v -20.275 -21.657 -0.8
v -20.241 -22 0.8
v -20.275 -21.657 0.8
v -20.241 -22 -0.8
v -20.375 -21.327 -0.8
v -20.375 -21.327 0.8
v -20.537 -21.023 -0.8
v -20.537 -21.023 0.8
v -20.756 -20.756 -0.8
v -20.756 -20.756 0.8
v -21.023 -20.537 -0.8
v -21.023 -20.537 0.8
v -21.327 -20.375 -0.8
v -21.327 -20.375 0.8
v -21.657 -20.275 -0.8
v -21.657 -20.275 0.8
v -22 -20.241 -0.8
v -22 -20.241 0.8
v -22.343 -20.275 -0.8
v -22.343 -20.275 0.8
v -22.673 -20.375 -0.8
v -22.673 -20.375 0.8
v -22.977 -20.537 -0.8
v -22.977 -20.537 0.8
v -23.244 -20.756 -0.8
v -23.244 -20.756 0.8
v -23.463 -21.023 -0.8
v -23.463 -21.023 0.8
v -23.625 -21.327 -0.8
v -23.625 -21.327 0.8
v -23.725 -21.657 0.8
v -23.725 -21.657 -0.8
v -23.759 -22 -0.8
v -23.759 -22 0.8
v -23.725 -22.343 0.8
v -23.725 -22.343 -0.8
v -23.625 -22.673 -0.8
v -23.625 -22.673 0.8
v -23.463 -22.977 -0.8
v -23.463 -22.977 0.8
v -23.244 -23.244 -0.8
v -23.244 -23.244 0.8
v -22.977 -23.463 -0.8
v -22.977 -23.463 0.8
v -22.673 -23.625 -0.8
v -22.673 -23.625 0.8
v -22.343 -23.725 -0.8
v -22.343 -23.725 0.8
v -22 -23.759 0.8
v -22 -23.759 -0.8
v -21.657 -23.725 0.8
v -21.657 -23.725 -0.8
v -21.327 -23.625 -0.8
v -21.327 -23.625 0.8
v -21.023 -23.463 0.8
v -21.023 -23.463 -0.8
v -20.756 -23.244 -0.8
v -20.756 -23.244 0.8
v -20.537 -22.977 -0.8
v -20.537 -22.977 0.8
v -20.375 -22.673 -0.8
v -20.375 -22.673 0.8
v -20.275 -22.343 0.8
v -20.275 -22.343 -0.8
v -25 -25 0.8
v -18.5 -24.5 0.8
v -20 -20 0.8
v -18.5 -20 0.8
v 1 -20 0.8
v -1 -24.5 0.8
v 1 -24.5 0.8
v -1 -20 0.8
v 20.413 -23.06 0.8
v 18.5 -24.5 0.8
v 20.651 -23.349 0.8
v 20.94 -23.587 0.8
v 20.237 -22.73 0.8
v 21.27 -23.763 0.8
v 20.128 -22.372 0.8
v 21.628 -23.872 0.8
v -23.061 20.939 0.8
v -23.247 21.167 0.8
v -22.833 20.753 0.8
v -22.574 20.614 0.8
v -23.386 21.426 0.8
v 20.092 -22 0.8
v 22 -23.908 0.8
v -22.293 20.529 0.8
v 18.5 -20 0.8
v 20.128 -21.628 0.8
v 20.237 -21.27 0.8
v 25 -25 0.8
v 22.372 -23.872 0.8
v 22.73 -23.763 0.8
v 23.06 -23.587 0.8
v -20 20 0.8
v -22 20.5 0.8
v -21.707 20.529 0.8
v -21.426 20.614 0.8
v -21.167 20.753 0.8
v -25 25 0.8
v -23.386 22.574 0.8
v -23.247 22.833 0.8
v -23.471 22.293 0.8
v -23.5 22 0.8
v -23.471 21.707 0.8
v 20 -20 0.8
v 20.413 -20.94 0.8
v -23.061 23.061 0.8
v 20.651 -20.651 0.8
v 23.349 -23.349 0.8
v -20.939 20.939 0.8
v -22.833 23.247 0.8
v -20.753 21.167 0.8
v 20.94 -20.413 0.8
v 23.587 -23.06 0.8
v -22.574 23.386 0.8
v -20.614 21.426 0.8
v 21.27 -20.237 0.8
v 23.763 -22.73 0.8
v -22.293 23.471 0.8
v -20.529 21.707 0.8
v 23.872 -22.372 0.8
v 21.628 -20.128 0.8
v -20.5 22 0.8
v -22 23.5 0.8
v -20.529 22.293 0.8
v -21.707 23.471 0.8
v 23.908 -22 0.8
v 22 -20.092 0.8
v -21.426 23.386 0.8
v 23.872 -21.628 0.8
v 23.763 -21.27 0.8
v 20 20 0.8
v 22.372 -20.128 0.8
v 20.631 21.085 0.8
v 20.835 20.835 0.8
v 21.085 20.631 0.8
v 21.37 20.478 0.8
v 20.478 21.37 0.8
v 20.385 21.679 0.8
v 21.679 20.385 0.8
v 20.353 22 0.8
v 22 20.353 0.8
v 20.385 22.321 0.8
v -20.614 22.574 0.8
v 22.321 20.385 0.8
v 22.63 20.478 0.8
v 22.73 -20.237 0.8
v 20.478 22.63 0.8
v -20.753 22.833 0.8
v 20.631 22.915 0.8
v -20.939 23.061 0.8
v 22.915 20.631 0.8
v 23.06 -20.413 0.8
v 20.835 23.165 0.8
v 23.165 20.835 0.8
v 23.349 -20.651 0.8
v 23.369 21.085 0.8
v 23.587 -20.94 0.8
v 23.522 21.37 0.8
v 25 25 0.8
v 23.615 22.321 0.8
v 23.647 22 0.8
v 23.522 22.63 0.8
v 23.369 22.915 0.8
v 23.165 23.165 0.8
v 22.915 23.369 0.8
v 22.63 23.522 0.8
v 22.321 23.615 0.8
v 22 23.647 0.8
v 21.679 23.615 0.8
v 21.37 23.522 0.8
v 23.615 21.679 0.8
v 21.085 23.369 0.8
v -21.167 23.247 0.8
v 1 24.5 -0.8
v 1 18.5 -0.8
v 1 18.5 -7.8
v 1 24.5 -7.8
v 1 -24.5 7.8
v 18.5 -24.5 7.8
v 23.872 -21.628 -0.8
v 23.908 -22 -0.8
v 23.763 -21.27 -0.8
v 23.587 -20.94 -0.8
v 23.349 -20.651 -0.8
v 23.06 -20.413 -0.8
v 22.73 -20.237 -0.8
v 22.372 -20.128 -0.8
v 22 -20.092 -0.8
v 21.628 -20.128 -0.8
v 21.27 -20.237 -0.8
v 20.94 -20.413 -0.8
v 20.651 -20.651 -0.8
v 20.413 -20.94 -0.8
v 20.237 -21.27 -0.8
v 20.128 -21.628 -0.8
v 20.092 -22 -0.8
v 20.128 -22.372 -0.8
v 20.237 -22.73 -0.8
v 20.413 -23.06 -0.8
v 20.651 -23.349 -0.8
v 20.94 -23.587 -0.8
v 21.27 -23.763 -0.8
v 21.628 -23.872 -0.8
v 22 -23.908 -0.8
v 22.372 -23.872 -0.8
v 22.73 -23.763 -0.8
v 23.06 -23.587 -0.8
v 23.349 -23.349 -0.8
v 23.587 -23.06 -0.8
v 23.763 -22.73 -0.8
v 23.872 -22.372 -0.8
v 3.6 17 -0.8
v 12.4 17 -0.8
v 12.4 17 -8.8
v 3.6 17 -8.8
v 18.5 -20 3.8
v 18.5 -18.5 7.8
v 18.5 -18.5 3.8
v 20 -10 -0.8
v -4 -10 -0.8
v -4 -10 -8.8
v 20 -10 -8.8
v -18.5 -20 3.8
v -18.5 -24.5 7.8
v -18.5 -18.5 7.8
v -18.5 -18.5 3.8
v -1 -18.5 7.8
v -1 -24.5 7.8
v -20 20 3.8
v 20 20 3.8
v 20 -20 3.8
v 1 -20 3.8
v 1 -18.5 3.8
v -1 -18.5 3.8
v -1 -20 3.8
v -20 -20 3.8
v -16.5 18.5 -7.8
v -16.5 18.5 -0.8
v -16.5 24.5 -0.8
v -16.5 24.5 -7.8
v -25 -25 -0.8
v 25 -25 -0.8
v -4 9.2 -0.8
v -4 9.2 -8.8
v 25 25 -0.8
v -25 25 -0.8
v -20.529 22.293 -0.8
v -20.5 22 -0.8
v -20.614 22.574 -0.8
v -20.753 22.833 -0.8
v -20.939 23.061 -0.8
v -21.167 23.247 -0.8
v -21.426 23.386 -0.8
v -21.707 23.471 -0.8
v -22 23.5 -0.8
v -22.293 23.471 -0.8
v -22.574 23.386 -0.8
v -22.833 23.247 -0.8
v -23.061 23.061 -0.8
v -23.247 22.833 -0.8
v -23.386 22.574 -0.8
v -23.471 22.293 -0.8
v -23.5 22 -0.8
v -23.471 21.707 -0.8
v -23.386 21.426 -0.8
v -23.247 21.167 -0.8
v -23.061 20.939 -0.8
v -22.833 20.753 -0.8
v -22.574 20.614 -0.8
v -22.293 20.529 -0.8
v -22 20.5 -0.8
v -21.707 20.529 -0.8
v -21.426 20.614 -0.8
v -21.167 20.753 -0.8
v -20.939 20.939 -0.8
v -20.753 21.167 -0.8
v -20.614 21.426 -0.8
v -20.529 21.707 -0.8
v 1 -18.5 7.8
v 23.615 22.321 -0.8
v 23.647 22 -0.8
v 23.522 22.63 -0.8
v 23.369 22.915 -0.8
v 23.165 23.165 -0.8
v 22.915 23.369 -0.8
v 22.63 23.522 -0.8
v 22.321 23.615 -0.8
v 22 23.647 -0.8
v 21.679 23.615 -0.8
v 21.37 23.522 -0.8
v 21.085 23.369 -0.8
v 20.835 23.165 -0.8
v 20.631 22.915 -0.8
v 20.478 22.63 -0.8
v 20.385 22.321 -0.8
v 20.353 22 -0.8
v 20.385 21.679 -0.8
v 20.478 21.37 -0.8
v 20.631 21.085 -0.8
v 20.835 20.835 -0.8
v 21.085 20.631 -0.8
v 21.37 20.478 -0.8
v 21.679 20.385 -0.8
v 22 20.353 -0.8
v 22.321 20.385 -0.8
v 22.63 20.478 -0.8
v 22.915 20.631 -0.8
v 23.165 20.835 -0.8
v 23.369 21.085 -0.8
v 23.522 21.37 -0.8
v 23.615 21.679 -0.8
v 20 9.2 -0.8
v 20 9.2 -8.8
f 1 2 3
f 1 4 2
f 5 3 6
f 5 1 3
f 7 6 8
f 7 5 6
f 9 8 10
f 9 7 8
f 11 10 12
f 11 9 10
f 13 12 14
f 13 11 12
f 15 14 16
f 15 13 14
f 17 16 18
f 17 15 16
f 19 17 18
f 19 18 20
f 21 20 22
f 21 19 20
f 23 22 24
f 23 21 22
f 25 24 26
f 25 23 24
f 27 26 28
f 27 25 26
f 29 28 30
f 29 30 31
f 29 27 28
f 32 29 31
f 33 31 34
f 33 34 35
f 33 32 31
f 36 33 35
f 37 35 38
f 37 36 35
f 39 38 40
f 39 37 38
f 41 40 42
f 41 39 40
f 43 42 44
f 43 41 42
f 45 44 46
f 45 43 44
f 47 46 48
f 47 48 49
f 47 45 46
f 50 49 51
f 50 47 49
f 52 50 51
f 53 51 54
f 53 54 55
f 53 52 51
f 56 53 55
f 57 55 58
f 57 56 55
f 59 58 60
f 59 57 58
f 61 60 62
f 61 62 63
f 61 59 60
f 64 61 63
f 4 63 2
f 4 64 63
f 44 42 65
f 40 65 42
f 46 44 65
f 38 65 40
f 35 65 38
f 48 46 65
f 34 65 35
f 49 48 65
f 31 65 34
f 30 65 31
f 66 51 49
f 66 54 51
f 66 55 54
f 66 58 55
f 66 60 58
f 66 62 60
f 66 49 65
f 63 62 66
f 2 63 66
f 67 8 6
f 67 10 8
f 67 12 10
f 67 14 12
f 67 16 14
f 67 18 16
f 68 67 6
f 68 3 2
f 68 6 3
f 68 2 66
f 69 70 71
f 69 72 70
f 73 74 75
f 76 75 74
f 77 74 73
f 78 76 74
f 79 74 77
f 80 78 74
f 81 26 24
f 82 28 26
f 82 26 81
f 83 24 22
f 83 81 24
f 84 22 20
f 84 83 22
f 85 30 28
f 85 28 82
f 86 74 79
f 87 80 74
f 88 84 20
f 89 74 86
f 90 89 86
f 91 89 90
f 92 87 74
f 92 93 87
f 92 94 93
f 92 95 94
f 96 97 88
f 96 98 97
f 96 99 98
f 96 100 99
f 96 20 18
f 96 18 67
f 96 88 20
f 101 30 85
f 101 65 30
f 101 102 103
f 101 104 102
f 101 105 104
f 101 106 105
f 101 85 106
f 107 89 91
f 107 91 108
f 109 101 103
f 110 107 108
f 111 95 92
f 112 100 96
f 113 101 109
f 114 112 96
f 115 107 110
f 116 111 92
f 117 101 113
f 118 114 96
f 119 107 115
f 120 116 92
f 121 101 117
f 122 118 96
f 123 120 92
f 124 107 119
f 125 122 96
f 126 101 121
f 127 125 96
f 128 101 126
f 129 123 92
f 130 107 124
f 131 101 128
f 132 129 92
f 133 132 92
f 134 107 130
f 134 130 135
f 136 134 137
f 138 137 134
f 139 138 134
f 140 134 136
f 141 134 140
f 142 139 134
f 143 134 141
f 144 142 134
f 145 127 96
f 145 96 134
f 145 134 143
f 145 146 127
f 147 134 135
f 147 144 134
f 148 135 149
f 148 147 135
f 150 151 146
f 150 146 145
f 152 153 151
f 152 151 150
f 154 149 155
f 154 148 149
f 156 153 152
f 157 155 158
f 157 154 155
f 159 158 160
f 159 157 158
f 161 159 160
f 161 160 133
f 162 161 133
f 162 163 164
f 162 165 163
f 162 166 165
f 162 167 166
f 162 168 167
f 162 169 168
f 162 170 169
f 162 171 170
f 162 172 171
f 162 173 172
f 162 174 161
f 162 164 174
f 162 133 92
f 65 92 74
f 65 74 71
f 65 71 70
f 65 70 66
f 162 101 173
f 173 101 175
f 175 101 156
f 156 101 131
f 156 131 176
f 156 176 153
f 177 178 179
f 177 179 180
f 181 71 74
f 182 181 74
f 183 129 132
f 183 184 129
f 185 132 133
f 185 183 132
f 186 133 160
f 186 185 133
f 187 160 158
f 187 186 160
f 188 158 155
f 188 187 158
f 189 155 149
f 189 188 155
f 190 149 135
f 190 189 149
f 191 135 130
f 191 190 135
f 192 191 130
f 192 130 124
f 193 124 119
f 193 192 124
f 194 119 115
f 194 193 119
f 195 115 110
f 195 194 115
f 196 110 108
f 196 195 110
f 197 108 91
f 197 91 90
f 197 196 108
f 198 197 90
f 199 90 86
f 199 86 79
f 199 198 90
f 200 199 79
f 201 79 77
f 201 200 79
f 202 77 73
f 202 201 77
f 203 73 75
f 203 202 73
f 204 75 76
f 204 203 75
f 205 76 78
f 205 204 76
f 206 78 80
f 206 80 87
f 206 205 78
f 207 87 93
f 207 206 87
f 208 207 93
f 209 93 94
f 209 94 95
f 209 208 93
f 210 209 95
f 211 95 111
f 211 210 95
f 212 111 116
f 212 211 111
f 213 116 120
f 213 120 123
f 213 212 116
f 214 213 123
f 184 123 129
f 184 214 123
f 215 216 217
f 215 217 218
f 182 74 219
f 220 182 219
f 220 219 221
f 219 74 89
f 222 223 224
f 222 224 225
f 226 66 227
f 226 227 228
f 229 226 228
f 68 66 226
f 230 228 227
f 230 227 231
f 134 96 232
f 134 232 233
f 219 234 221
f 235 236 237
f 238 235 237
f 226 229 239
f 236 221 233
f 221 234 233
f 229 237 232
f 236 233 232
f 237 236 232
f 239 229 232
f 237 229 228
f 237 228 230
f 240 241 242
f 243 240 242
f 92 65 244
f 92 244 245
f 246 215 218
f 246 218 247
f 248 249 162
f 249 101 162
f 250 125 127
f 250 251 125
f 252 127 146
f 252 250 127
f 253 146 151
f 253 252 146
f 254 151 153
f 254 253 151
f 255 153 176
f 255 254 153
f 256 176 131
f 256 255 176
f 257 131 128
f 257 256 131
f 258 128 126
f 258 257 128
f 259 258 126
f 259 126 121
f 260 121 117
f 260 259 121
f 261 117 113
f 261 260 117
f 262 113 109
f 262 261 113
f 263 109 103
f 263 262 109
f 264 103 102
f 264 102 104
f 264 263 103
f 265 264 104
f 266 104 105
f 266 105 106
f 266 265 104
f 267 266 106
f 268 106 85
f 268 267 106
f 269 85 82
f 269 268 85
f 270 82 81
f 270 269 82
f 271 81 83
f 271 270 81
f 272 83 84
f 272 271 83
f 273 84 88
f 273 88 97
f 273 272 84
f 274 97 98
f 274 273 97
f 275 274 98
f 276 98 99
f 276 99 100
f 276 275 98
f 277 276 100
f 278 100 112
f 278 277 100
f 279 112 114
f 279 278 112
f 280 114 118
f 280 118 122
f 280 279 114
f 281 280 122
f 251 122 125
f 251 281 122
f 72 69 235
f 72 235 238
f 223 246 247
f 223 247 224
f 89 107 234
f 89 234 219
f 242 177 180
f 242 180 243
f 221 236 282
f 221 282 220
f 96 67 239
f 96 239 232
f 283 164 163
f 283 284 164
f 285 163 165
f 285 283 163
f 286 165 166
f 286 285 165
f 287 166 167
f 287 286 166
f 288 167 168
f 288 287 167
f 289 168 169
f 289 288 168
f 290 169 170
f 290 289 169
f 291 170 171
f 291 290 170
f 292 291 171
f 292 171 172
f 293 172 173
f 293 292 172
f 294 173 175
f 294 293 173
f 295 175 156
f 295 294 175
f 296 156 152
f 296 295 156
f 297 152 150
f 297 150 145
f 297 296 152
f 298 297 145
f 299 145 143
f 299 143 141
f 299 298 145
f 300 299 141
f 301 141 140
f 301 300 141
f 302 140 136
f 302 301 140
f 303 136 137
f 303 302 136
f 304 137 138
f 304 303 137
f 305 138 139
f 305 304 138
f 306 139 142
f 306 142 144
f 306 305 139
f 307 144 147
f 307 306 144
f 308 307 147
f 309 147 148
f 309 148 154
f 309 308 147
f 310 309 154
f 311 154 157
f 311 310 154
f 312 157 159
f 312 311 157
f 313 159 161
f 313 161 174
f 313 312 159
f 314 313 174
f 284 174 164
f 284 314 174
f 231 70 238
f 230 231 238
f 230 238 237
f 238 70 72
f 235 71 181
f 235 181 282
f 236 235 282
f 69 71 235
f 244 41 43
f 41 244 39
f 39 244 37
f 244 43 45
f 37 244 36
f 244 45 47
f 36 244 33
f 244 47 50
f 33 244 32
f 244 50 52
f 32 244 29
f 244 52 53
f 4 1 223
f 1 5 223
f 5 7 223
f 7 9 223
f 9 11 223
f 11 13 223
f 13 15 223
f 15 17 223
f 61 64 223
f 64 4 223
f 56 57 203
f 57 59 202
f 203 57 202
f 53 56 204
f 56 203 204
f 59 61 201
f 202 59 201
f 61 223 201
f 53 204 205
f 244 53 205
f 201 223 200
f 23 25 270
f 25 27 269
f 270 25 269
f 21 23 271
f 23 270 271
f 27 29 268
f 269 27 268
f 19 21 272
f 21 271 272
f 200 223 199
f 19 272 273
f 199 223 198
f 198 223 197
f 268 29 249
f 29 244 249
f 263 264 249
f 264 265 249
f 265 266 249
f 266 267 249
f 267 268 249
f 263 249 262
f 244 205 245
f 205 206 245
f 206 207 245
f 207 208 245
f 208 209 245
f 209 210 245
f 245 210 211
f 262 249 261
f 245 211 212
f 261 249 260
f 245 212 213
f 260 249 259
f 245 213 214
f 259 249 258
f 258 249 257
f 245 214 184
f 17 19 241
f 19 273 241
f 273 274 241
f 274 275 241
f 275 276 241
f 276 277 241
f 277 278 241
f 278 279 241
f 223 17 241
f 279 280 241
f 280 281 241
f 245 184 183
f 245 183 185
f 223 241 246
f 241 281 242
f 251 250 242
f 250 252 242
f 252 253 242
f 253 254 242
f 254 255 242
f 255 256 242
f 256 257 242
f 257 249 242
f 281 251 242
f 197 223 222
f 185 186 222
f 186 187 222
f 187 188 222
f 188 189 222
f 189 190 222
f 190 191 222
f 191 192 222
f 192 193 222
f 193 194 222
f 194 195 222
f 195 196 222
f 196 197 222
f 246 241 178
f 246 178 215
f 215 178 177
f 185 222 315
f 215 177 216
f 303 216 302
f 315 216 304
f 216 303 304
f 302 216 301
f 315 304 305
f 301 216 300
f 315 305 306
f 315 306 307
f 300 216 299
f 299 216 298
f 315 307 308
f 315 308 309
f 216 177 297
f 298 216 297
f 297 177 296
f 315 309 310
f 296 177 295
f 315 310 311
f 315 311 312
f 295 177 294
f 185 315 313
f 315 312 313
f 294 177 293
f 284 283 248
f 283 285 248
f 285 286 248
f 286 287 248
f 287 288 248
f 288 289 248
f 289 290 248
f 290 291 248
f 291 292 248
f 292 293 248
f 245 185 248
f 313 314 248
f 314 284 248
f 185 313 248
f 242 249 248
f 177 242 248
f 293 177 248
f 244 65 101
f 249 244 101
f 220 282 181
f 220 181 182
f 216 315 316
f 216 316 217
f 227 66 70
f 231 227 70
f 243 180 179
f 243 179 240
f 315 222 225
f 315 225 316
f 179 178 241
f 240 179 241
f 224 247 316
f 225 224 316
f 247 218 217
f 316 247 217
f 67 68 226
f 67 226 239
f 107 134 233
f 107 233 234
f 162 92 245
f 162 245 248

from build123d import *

# Parameters (mm, degrees)
SKETCH1_W      = 50
SKETCH1_H      = 50
SKETCH1_R      = 1.5
SKETCH1_R_2    = 1.646935024
SKETCH1_R_3    = 1.908192471
SKETCH1_R_4    = 1.759080553
EXTRUDE2_DEPTH = 0.8
EXTRUDE3_DEPTH = 3
EXTRUDE4_DEPTH = 8
SKETCH4_W      = 17.5
SKETCH4_H      = 6
EXTRUDE6_DEPTH = 7
SKETCH5_W      = 17.5
SKETCH5_H      = 6
EXTRUDE7_DEPTH = 7


with BuildPart() as part:
    # Sketch1 → Extrude2 (new, symmetric)
    with BuildSketch(Plane.XY):
        Rectangle(SKETCH1_W, SKETCH1_H)
        with Locations((-22, 22)):
            Circle(SKETCH1_R, mode=Mode.SUBTRACT)
        with Locations((22, 22)):
            Circle(SKETCH1_R_2, mode=Mode.SUBTRACT)
        with Locations((22, -22)):
            Circle(SKETCH1_R_3, mode=Mode.SUBTRACT)
        with Locations((-22, -22)):
            Circle(SKETCH1_R_4, mode=Mode.SUBTRACT)
    extrude(amount=EXTRUDE2_DEPTH, both=True)

    # Sketch2 → Extrude3 (add)
    with BuildSketch(Plane.XY.offset(0.8)):
        Polygon((-20, 20), (20, -20), (-20, -20), align=None)
        Polygon((-20, 20), (20, 20), (20, -20), align=None)
    extrude(amount=EXTRUDE3_DEPTH)

    # Sketch3 → Extrude4 (add)
    with BuildSketch(Plane(origin=(0, 0, -0.8), x_dir=(-1, 0, 0), z_dir=(0, 0, -1))):
        Polygon((-20, -10), (-20, 9.2), (-12.4, 17), (-3.6, 17), (4, 9.2), (4, -10), align=None)
    extrude(amount=EXTRUDE4_DEPTH)

    # Sketch4 → Extrude6 (add)
    with BuildSketch(Plane.XY.offset(0.8)):
        with Locations((9.75, -21.5)):
            Rectangle(SKETCH4_W, SKETCH4_H)
        with Locations((-9.75, -21.5)):
            Rectangle(SKETCH4_W, SKETCH4_H)
    extrude(amount=EXTRUDE6_DEPTH)

    # Sketch5 → Extrude7 (add)
    with BuildSketch(Plane(origin=(0, 0, -0.8), x_dir=(-1, 0, 0), z_dir=(0, 0, -1))):
        with Locations((7.75, 21.5)):
            Rectangle(SKETCH5_W, SKETCH5_H)
    extrude(amount=EXTRUDE7_DEPTH)


solid = part.part
